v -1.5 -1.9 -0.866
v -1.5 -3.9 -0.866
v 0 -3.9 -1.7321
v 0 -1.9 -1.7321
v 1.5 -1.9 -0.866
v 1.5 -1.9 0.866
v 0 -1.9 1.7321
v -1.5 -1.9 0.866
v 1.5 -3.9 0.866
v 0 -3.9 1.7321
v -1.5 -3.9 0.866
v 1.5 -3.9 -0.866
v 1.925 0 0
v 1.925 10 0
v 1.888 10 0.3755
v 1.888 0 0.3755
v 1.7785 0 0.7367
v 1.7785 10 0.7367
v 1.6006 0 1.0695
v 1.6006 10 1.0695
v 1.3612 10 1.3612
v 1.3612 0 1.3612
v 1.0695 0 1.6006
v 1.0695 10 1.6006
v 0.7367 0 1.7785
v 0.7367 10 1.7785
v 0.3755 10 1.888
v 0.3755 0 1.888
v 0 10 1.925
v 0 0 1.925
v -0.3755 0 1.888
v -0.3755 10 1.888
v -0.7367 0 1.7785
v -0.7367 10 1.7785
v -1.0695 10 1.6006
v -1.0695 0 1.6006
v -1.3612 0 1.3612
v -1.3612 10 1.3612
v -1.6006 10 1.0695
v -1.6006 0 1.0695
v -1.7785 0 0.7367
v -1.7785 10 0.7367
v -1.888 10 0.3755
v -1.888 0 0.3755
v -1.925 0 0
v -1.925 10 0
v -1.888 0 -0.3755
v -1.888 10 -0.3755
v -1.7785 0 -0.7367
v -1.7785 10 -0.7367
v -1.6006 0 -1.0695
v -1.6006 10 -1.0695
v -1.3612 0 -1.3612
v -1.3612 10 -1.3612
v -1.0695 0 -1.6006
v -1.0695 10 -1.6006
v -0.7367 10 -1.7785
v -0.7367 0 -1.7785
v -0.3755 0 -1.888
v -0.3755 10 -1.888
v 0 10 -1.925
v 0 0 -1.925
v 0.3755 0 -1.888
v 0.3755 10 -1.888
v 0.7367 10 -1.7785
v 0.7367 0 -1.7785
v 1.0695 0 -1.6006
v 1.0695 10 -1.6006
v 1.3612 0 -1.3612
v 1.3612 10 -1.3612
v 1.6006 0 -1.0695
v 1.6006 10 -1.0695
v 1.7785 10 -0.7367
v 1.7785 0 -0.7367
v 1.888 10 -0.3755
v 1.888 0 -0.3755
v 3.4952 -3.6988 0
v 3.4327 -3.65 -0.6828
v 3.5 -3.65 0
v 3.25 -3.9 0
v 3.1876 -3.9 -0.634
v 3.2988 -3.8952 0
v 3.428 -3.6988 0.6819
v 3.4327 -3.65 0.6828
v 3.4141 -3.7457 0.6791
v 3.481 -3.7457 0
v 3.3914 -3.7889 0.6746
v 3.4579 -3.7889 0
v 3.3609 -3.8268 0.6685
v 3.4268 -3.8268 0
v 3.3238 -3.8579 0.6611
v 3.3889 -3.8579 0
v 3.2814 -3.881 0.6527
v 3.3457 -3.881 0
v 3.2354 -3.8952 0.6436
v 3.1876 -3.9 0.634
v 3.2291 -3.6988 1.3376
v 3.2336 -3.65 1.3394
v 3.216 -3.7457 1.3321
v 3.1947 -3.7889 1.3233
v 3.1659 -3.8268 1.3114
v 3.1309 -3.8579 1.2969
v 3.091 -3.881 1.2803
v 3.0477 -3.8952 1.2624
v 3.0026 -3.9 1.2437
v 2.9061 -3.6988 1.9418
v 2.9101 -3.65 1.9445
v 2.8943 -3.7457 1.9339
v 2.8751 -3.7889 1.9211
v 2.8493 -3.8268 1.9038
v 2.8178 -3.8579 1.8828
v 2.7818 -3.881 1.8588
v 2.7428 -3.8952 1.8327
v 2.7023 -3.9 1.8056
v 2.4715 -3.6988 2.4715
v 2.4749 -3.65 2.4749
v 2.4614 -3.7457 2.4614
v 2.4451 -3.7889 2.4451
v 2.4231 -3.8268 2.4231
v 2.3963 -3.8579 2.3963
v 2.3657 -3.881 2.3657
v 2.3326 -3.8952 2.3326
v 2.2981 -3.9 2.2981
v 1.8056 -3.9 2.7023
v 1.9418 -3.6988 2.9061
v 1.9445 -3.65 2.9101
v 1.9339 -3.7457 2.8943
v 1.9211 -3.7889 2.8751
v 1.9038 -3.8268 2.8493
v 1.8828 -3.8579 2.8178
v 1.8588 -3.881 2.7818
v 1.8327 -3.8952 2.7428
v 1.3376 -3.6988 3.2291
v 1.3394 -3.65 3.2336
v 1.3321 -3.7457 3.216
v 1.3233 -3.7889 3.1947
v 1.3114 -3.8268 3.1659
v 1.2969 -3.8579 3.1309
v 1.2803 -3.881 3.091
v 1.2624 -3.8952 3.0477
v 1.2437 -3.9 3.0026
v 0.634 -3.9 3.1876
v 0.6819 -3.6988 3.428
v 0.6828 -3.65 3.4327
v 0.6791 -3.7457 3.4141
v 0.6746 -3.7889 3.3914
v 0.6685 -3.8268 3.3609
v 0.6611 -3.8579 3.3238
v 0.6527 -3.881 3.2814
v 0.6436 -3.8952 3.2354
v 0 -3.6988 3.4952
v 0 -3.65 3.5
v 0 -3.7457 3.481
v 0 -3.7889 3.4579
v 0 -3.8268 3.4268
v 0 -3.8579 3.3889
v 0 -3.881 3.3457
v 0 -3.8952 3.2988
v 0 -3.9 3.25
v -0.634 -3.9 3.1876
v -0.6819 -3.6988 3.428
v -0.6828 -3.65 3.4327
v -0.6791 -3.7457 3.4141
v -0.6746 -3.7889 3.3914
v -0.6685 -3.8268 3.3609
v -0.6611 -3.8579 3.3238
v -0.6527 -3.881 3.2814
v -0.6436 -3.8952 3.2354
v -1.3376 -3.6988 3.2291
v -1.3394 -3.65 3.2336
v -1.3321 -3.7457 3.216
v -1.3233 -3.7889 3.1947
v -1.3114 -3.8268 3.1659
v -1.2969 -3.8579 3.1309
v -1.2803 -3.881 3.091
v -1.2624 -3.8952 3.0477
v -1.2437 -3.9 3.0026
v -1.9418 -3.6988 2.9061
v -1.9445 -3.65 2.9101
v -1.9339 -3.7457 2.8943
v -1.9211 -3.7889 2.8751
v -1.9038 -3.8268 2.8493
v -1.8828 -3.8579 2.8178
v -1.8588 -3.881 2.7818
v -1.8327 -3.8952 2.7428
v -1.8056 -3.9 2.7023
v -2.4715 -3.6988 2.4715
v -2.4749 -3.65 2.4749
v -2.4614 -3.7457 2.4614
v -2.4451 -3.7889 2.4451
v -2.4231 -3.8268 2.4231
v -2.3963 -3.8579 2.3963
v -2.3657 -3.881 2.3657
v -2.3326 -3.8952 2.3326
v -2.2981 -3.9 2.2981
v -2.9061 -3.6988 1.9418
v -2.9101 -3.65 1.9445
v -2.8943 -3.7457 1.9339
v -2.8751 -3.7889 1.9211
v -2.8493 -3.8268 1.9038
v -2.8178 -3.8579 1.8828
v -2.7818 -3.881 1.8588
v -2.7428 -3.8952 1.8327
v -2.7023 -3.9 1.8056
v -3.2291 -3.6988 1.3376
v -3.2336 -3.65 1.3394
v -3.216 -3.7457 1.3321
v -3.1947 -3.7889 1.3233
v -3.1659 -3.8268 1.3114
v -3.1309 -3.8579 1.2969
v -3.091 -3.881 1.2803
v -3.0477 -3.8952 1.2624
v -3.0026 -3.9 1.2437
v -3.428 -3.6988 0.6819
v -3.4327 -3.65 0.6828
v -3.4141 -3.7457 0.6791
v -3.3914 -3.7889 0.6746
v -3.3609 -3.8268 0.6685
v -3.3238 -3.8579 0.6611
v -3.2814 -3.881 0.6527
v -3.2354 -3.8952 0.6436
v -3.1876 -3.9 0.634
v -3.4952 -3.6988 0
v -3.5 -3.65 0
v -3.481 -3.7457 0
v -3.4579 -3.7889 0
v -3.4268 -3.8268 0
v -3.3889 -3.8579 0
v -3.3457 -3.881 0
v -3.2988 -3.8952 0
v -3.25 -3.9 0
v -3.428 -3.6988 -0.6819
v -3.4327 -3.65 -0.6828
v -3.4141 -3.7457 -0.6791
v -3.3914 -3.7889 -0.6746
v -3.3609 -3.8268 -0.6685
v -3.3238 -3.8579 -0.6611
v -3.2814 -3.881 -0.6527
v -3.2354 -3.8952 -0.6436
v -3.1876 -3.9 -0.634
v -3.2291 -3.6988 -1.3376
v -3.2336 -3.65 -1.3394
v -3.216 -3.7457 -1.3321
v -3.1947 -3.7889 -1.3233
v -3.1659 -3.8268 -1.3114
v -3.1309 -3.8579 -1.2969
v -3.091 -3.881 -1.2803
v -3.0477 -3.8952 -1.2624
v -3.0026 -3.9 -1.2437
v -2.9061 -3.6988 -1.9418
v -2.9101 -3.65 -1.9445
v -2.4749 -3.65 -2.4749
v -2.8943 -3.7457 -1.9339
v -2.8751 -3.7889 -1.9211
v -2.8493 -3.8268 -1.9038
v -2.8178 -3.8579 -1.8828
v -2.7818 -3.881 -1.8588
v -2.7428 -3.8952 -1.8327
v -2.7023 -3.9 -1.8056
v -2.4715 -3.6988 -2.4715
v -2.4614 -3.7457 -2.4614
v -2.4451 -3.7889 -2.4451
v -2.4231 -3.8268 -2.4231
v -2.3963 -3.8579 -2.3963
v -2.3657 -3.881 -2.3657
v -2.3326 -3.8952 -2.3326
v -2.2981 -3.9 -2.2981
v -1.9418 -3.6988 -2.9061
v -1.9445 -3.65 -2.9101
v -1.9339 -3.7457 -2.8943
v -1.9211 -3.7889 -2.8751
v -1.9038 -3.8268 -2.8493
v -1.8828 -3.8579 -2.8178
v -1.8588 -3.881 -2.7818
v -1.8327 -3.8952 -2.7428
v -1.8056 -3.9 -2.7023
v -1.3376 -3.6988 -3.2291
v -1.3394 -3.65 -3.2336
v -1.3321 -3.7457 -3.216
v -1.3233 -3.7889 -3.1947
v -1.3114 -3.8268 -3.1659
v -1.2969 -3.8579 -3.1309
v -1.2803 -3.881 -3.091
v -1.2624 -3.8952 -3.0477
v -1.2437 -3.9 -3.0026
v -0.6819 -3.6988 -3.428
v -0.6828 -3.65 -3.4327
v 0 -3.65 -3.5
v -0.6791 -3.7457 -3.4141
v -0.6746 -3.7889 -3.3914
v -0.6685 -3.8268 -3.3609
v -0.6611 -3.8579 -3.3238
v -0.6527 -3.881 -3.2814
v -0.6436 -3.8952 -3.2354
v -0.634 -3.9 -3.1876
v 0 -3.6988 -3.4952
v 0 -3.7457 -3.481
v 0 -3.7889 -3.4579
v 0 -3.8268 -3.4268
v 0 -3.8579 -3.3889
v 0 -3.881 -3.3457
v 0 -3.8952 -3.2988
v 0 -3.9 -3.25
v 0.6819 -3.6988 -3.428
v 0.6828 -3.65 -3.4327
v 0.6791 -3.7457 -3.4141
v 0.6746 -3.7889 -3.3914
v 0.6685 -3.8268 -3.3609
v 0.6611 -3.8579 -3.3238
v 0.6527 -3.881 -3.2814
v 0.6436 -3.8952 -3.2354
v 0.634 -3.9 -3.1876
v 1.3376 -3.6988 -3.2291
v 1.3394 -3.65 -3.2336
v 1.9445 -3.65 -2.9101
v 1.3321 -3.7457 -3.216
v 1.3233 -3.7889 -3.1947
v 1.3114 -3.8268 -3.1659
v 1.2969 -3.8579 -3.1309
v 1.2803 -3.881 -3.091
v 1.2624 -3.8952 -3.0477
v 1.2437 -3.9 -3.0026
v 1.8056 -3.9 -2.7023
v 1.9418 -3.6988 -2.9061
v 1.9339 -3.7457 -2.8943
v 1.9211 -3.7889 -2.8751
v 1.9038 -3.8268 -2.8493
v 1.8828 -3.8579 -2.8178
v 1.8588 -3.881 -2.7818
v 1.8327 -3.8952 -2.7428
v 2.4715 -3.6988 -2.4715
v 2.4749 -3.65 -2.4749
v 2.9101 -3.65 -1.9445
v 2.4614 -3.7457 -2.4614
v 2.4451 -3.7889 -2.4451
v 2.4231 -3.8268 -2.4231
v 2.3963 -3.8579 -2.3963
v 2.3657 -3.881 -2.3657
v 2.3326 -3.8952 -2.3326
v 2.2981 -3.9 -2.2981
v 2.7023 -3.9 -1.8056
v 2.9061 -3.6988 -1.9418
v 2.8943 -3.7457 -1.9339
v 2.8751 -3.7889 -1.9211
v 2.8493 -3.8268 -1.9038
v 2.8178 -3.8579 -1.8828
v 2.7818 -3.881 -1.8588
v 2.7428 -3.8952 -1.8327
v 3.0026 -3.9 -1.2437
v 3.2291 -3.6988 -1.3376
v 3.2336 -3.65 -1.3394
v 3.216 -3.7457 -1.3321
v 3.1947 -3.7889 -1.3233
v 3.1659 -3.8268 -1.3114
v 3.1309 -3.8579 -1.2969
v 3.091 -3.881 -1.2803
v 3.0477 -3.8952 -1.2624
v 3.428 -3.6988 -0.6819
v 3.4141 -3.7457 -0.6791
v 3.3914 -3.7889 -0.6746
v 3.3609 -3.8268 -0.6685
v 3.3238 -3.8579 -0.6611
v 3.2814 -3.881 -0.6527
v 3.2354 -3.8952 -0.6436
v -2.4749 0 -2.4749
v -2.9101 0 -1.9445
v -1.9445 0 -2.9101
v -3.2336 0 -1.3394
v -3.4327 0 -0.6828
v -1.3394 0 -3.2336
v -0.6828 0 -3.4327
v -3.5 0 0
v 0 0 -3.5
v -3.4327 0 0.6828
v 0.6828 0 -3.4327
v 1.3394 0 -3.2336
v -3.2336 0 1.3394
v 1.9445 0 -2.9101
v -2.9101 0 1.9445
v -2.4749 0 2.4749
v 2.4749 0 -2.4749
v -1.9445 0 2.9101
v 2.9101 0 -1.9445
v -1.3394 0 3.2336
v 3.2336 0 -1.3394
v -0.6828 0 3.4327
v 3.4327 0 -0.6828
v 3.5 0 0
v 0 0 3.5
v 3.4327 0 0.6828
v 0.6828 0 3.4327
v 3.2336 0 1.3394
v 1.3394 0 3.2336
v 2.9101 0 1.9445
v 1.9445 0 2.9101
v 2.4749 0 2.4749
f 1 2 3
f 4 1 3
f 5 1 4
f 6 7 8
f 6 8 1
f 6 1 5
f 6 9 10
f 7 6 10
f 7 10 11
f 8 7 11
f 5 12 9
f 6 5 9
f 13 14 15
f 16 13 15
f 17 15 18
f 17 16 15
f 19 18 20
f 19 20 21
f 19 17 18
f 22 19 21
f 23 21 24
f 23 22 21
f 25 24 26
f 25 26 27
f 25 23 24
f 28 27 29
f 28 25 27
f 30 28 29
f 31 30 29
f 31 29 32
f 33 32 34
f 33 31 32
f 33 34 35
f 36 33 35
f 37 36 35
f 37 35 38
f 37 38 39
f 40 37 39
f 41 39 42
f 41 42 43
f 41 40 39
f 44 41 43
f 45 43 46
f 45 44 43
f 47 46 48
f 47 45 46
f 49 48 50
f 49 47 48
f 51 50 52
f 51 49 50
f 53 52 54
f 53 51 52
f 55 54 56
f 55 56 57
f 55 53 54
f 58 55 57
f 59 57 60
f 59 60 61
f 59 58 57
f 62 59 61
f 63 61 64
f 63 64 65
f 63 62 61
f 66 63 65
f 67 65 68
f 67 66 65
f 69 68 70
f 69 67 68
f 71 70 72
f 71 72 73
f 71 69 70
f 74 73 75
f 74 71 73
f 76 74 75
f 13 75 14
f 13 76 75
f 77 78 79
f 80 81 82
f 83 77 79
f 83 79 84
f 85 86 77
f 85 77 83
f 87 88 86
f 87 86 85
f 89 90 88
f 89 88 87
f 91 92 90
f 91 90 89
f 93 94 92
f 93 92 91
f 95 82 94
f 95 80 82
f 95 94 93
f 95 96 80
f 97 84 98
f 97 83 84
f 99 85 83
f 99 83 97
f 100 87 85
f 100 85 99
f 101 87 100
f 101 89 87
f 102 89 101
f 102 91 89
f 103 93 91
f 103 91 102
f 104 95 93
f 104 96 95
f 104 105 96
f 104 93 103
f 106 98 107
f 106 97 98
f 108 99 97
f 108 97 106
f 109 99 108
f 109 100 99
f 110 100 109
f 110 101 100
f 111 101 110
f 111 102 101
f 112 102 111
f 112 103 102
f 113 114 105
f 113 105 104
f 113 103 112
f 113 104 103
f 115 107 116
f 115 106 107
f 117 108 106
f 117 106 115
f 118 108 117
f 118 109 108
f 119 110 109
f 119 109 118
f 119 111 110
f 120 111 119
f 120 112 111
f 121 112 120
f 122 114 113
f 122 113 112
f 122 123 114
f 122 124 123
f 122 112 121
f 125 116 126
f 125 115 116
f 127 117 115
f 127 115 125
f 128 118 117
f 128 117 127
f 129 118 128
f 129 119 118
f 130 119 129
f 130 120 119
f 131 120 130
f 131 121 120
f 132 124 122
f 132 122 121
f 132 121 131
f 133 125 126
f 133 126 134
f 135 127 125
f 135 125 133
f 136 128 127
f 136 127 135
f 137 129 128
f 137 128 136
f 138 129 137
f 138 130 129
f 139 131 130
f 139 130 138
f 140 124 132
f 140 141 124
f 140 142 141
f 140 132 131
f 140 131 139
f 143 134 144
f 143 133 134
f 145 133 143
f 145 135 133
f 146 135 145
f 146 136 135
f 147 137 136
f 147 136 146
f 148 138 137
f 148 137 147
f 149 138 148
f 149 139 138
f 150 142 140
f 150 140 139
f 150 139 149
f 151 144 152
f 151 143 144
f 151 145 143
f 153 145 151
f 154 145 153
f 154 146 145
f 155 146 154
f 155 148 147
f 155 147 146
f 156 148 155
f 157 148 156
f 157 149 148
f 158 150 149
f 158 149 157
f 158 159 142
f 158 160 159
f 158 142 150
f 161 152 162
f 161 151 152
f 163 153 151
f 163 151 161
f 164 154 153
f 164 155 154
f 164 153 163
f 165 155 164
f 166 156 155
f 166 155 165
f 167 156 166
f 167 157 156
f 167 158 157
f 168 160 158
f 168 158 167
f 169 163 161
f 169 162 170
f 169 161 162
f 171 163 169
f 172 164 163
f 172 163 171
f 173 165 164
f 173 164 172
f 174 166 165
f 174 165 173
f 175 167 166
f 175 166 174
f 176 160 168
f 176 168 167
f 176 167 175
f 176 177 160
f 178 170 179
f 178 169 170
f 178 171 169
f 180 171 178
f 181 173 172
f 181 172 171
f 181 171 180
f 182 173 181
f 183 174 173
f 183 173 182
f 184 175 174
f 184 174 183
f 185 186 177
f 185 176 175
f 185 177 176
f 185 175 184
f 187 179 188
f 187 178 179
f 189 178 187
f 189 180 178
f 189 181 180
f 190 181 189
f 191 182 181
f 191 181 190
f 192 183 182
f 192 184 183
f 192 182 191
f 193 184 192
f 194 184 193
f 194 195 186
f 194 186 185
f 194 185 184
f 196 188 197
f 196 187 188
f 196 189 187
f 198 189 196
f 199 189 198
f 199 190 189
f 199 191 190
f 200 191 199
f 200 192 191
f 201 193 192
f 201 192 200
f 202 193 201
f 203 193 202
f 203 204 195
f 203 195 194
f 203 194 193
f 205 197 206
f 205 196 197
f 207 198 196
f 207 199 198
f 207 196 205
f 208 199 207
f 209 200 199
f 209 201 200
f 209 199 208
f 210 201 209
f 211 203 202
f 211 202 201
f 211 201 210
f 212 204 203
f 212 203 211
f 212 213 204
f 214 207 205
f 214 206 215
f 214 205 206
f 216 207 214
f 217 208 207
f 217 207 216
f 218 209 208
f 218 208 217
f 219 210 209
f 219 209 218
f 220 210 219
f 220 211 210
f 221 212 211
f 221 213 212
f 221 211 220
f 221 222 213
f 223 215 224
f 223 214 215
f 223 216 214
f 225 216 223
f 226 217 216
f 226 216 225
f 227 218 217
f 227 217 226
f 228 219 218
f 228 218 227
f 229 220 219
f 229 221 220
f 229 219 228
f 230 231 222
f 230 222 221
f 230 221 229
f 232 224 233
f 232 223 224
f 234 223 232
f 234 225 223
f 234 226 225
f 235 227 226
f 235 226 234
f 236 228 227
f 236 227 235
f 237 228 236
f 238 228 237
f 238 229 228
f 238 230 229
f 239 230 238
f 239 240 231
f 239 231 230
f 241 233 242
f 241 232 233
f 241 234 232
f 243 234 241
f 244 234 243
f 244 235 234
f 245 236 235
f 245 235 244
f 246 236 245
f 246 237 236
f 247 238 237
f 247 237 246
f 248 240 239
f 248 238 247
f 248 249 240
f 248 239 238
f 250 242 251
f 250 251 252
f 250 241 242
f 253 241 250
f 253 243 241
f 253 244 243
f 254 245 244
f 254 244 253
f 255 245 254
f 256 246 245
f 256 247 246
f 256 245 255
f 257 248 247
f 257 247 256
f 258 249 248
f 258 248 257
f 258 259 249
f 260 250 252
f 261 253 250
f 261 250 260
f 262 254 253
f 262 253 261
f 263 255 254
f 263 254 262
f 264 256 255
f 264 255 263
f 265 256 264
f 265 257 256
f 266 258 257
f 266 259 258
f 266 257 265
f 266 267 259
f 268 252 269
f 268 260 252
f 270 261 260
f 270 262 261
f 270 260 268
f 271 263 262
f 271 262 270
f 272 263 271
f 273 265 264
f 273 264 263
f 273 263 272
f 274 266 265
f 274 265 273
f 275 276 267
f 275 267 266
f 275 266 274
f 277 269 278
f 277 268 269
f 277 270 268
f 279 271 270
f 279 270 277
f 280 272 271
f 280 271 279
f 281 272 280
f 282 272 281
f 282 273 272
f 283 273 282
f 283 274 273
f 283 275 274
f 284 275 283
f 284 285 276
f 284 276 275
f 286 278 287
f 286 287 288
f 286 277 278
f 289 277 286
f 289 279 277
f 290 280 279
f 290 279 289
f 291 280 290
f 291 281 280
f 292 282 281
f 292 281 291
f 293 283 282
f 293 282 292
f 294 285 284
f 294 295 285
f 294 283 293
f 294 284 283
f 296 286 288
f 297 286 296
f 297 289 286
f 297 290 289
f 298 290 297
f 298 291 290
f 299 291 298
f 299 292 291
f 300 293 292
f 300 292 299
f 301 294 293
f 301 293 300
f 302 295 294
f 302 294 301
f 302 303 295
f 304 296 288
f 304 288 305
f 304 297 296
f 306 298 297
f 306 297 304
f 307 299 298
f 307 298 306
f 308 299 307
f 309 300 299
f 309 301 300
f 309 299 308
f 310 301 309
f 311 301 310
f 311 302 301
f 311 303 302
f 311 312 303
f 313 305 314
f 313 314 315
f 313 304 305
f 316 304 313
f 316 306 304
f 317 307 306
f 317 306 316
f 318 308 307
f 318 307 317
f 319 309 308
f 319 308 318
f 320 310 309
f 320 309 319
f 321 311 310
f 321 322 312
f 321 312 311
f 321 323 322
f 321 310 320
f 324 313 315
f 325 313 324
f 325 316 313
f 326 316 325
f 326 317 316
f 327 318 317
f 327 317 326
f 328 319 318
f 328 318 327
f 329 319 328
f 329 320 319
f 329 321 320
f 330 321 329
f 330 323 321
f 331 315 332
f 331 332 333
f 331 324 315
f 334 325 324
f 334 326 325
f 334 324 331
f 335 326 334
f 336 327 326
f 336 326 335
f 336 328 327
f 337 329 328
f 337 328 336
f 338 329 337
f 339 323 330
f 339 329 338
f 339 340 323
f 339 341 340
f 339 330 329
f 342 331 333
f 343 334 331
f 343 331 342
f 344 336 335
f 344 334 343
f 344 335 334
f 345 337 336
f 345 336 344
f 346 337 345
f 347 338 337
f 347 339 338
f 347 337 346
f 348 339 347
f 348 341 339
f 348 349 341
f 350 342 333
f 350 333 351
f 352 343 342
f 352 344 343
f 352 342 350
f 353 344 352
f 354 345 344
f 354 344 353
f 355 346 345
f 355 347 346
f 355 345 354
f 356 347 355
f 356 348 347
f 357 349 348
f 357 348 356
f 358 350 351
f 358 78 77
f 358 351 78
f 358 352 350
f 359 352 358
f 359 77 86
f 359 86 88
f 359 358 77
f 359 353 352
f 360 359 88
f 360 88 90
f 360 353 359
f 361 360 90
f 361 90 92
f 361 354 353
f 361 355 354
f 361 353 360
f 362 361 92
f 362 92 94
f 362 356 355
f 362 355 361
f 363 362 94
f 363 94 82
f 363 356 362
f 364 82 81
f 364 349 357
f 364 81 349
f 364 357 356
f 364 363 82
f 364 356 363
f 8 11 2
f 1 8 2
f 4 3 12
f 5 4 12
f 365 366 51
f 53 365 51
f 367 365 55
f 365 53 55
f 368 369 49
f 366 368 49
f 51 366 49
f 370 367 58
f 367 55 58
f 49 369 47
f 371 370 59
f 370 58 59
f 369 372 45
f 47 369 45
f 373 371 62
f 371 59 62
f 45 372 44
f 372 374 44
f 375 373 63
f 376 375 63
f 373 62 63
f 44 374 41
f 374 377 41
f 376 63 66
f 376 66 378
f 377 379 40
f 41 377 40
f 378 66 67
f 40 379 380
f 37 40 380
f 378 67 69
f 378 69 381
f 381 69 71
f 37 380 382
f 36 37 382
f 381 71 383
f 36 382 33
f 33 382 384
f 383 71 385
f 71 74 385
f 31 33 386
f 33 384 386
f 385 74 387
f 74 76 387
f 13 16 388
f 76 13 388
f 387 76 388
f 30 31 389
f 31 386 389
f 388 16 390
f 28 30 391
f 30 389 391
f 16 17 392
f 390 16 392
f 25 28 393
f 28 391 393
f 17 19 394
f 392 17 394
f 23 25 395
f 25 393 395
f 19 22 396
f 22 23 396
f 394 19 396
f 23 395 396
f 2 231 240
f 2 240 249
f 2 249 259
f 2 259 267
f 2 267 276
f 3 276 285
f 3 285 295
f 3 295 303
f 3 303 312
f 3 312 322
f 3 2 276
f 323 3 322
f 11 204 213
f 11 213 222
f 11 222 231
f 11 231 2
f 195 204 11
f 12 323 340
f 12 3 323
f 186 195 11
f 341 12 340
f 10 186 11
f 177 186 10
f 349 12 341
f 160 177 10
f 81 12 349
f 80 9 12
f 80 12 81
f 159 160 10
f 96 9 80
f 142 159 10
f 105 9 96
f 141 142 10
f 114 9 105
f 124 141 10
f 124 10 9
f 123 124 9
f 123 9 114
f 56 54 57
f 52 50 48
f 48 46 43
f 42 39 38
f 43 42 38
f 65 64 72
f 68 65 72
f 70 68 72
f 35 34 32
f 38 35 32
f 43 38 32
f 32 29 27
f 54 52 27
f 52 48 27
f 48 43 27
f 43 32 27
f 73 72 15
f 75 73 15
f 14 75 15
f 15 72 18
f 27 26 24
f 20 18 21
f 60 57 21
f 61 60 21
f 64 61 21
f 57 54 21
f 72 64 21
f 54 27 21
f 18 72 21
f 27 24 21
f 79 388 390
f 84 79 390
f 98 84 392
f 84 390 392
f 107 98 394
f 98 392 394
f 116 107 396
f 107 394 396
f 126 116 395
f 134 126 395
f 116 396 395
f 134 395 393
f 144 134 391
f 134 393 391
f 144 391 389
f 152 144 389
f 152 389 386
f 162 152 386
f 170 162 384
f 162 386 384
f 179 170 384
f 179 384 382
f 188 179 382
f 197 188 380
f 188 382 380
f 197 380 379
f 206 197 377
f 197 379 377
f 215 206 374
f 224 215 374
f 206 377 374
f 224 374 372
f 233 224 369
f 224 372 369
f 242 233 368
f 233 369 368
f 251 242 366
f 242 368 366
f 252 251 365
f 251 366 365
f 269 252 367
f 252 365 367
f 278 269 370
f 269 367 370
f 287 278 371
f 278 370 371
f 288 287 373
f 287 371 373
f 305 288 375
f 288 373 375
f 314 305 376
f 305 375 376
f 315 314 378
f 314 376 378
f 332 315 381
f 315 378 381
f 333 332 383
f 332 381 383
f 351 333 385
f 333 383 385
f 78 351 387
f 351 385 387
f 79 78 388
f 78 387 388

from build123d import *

# Parameters (mm, degrees)
F0_R     = 3.5
F0_R_2   = 1.925
F1_DEPTH = 3.9
F2_DEPTH = 10
F4_DEPTH = 2
F5_R     = 0.25


with BuildPart() as f1:
    # F0 (on Front) → F1 (new body)
    with BuildSketch(Plane.XZ):
        Circle(F0_R)
        Circle(F0_R_2, mode=Mode.SUBTRACT)
        Circle(F0_R_2)
    extrude(amount=F1_DEPTH)

    # F0 (on Front) → F2 (join)
    with BuildSketch(Plane.XZ):
        Circle(F0_R_2)
    extrude(amount=-F2_DEPTH)

    # F3 (on face) → F4 (cut)
    with BuildSketch(Plane.XZ.offset(3.9)):
        Polygon((1.5, -0.8660254038), (1.5, 0.8660254038), (0, 1.7320508076), (-1.5, 0.8660254038), (-1.5, -0.8660254038), (0, -1.7320508076), align=None)
    extrude(amount=-F4_DEPTH, mode=Mode.SUBTRACT)

    # F5
    f5_edges = [f1.edges().sort_by_distance(p)[0] for p in [
        (-3.5, -3.9, 0),
    ]]
    fillet(f5_edges, radius=F5_R)


solid = f1.part
